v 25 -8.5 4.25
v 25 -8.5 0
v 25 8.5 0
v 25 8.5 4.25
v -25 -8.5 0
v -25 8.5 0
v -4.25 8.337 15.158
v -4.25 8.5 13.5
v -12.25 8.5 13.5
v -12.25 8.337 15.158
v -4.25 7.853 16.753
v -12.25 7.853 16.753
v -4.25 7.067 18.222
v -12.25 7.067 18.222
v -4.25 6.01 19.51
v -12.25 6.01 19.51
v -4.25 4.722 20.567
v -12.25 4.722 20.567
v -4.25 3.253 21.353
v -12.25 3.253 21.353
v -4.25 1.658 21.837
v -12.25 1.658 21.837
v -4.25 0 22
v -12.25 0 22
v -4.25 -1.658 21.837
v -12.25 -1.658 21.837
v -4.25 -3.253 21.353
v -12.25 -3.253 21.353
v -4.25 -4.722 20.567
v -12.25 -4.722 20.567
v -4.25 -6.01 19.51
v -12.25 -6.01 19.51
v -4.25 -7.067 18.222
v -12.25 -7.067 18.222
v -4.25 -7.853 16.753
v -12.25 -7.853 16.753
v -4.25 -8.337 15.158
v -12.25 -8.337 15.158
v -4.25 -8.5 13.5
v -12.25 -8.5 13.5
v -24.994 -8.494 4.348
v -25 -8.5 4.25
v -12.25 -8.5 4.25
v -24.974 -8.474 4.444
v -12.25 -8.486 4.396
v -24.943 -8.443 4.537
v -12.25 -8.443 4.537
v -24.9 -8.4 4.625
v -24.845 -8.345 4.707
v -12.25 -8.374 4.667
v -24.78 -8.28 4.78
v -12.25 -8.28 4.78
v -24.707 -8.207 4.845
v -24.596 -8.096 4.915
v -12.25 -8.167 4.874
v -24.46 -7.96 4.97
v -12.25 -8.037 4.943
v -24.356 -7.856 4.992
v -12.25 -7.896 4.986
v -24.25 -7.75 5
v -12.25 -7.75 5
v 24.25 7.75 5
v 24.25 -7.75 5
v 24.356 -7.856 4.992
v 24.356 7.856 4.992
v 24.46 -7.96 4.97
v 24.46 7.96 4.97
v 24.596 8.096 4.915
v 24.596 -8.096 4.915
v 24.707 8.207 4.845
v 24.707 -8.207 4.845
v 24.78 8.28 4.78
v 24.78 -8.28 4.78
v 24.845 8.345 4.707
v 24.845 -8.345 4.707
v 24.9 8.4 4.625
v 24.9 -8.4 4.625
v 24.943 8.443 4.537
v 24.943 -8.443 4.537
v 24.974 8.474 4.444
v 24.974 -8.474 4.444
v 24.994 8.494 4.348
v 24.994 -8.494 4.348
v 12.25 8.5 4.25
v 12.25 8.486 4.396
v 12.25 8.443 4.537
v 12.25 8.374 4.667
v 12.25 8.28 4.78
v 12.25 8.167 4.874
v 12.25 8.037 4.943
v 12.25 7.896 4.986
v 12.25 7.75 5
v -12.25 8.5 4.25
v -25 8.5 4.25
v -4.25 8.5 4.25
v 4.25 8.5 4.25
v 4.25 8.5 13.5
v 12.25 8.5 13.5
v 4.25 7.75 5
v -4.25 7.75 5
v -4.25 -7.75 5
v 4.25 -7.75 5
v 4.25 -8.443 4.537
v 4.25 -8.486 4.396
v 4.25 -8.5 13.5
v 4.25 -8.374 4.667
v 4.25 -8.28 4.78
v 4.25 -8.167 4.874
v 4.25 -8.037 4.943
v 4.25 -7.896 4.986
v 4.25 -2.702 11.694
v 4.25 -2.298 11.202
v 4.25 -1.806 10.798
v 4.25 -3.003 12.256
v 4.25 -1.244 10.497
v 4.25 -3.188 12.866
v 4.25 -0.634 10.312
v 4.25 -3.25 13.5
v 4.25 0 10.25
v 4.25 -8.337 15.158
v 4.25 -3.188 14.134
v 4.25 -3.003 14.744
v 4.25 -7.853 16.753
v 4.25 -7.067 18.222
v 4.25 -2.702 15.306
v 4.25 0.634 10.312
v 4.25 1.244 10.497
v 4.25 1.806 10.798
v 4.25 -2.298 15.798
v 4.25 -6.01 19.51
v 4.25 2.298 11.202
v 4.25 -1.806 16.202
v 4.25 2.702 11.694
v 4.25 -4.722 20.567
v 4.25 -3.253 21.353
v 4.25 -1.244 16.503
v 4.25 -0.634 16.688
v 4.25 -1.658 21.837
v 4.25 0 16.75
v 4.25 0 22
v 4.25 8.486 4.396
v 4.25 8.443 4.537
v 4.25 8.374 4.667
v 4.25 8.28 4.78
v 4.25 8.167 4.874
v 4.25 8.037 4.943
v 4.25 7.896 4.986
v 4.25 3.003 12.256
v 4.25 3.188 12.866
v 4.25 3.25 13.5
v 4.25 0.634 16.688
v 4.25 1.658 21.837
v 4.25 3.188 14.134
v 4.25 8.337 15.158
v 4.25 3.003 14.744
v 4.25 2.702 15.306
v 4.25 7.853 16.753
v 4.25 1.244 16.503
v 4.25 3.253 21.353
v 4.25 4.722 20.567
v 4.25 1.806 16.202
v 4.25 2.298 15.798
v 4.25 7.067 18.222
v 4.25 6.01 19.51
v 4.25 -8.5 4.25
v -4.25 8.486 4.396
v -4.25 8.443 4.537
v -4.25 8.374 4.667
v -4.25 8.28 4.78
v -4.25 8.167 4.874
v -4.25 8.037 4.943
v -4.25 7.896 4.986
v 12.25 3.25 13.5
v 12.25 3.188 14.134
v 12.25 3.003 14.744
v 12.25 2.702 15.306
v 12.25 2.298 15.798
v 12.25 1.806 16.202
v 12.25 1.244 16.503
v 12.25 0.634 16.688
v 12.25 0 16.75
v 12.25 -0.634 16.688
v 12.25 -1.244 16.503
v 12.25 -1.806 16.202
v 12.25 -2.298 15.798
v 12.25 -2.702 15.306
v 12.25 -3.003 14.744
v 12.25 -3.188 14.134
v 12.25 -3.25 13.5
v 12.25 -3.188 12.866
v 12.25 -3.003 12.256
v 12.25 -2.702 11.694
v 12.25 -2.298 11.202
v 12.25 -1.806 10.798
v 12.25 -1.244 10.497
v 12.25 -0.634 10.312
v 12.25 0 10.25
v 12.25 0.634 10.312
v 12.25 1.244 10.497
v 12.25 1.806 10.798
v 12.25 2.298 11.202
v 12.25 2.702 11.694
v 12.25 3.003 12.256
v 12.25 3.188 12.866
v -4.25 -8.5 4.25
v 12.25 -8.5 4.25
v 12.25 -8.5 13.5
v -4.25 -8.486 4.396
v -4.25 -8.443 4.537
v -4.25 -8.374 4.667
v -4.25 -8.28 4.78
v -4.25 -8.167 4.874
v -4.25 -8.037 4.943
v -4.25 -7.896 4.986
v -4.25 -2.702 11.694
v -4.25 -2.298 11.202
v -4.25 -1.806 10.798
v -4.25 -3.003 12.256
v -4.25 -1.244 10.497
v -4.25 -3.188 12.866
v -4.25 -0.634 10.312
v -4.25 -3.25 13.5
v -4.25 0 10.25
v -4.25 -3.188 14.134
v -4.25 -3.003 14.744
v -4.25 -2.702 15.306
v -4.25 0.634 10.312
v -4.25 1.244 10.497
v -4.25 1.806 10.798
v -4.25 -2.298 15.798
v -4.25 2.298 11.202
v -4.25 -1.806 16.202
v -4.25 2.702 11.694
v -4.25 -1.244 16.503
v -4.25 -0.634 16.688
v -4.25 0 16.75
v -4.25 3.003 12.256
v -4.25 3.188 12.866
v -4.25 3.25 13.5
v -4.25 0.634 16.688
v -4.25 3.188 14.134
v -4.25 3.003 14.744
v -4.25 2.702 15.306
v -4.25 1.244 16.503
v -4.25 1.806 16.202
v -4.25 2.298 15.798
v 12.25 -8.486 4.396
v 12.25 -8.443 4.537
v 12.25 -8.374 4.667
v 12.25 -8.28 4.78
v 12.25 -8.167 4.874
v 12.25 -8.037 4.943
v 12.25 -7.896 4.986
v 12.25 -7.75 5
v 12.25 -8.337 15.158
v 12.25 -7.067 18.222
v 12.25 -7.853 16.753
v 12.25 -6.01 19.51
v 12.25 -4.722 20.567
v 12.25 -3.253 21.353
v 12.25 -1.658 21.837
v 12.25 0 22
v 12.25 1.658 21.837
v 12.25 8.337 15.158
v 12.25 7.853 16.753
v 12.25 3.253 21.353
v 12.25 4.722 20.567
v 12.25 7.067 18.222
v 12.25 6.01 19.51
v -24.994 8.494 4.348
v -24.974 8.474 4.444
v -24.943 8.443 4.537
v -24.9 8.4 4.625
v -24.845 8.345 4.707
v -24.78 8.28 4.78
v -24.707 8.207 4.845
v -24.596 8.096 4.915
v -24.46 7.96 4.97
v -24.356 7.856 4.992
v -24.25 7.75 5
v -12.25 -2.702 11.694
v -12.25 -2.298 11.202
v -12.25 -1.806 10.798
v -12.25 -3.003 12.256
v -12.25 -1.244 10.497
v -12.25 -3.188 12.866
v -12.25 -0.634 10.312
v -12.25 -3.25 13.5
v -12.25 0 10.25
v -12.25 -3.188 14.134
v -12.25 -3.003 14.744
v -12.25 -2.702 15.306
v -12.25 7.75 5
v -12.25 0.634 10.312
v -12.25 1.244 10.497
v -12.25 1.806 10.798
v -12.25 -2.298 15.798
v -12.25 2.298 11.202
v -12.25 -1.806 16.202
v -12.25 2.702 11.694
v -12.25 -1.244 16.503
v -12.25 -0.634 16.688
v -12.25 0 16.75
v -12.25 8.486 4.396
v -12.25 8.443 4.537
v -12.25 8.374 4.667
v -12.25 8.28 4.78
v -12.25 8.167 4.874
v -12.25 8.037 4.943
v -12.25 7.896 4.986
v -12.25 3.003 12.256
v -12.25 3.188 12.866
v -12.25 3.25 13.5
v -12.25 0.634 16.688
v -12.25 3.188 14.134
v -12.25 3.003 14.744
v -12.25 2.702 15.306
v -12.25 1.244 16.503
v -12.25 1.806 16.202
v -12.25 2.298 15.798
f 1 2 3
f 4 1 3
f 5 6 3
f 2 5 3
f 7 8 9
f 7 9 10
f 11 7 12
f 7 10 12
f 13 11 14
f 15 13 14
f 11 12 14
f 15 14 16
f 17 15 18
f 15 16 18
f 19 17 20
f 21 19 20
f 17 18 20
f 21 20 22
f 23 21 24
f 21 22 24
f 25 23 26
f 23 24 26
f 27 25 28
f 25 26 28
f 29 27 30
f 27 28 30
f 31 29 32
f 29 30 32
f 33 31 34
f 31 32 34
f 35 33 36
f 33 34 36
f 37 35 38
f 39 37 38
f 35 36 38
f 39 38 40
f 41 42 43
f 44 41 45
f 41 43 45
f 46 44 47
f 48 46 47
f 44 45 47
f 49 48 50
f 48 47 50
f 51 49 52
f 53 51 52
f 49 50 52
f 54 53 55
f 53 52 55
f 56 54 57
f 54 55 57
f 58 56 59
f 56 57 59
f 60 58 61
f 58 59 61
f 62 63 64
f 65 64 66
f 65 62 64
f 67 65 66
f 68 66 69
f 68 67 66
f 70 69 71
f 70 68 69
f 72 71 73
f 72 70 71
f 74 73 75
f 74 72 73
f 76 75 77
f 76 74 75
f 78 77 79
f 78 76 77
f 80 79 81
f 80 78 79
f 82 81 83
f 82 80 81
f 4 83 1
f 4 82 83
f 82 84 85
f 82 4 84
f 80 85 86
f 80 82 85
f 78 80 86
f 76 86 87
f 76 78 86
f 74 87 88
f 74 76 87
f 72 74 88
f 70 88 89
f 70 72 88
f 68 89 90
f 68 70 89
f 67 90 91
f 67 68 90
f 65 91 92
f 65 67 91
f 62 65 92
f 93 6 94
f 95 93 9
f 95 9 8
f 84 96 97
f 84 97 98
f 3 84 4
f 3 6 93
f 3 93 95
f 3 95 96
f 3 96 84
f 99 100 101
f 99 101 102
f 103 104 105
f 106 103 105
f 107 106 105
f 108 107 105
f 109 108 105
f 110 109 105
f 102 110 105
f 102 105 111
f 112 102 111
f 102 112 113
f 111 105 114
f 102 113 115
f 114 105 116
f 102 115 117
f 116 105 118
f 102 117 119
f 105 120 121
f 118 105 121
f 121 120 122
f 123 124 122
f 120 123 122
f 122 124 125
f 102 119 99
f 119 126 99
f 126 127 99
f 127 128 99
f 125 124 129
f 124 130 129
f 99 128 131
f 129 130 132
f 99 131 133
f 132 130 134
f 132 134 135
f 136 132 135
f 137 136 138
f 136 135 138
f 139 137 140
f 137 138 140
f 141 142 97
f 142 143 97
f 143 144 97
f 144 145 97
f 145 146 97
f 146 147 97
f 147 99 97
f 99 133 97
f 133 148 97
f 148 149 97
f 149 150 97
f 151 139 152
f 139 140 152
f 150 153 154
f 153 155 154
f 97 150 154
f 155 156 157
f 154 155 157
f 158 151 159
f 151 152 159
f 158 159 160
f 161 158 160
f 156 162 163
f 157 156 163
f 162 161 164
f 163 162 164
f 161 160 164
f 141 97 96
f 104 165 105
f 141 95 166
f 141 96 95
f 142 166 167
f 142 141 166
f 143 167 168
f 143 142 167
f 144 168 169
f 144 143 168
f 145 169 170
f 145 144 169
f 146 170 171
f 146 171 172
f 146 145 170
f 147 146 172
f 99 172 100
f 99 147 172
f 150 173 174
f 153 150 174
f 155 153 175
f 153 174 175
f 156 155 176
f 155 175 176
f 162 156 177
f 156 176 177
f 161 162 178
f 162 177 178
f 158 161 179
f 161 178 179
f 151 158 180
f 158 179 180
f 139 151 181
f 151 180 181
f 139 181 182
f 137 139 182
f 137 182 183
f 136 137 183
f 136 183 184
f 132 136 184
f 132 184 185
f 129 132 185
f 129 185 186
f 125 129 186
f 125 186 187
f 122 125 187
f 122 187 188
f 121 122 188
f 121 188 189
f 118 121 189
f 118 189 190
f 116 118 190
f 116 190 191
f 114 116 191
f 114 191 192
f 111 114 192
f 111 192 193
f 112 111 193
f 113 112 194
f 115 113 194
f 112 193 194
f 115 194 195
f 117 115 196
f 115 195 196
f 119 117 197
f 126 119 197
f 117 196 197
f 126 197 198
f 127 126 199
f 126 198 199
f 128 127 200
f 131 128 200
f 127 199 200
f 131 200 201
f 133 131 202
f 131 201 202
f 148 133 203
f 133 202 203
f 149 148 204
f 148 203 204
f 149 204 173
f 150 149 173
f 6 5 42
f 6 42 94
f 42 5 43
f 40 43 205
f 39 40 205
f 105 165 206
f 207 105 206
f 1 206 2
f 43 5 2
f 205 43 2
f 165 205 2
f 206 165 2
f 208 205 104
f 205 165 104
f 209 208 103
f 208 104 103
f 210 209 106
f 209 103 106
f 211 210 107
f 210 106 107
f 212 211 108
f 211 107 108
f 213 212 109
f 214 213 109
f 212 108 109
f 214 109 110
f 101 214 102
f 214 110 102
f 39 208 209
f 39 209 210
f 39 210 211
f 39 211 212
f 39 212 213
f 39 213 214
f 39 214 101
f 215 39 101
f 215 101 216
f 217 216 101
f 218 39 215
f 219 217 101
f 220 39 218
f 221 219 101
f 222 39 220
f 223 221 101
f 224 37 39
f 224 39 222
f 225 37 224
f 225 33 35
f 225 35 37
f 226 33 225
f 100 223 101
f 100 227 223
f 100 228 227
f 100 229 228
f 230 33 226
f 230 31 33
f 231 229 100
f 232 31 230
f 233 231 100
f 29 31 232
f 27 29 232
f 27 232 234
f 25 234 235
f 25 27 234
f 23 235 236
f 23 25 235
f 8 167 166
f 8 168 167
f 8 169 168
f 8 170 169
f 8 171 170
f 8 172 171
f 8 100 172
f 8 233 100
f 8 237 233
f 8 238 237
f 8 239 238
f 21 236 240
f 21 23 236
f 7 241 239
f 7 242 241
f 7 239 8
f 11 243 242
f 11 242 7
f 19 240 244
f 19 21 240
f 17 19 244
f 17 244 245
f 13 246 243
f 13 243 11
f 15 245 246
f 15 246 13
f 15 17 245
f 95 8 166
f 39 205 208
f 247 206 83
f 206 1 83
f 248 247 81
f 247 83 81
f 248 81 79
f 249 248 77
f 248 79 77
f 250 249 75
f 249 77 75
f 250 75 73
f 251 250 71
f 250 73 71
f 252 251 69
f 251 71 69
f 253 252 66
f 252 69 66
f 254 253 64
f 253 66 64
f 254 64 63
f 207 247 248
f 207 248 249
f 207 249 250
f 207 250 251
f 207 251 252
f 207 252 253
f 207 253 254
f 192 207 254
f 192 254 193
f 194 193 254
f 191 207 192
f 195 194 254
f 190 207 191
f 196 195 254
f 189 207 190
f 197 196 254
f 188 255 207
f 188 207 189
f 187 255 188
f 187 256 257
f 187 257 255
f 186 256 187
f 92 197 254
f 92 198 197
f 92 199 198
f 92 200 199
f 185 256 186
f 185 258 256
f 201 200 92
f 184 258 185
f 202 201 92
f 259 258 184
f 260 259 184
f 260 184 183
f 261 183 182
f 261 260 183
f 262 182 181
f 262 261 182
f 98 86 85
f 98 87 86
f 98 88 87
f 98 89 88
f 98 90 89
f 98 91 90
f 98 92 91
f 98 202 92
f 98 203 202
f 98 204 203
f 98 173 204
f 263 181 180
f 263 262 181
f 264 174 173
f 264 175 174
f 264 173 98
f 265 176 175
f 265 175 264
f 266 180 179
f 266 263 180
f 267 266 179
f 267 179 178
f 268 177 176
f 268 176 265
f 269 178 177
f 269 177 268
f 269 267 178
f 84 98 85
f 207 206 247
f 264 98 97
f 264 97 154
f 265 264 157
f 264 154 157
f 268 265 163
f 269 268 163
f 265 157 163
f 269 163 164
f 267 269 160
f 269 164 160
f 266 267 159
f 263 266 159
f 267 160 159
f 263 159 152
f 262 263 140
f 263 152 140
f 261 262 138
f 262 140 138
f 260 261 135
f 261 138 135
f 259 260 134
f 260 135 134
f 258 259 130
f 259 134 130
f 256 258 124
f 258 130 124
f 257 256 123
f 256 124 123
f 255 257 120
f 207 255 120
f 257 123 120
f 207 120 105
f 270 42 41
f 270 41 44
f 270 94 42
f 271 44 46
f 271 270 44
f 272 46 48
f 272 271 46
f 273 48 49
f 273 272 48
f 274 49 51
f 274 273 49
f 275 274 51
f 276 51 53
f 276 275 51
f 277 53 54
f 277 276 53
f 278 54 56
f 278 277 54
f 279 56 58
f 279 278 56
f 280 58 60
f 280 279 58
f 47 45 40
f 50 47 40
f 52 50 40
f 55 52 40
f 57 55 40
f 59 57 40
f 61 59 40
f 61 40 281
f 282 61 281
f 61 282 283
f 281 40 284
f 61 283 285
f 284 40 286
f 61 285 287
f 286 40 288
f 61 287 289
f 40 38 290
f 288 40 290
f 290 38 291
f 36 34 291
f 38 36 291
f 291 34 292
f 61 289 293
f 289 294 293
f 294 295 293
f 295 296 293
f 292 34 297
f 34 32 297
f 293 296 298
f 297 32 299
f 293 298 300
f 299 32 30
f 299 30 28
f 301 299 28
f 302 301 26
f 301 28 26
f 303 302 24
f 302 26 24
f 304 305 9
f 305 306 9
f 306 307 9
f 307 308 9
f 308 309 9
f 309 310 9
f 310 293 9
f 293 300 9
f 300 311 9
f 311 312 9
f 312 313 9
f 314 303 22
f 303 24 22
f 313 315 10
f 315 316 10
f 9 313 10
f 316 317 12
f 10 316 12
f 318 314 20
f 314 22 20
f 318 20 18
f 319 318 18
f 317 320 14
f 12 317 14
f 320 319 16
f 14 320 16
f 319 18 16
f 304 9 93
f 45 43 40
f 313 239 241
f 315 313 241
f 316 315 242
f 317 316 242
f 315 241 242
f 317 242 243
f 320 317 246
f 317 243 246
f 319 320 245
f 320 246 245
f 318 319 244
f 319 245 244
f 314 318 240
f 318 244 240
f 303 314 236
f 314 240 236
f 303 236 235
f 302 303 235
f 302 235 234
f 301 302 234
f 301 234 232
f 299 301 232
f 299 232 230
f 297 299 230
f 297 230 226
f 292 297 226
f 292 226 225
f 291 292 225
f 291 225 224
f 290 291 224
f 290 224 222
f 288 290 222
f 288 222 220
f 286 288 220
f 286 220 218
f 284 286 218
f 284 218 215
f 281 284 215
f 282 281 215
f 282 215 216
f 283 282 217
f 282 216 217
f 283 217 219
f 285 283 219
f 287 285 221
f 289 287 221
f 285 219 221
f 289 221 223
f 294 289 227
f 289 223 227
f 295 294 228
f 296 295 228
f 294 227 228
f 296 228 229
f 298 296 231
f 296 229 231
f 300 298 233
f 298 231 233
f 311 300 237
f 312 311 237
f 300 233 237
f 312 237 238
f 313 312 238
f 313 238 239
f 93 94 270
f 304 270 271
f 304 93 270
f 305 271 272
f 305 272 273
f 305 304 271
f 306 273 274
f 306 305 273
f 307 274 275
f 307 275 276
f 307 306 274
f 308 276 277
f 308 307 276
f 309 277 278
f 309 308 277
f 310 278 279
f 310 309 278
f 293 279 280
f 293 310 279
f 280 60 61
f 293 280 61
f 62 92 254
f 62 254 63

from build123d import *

# Parameters (mm, degrees)
F0_W      = 50
F0_H      = 17
F1_DEPTH  = 5
F5_DEPTH  = 8
F8_DEPTH  = 8
F9_R      = 3.25
F10_DEPTH = 25
F11_R     = 0.75


with BuildPart() as f1:
    # F0 (on Top) → F1 (new body)
    with BuildSketch(Plane.XY):
        Rectangle(F0_W, F0_H)
    extrude(amount=F1_DEPTH)

    # F4 (on line) → F5 (join)
    with BuildSketch(Plane.YZ.offset(-12.25)):
        with BuildLine():
            ThreePointArc((0, 5), (6.0104076401, 7.4895923599), (8.5, 13.5))
            ThreePointArc((8.5, 13.5), (0, 22), (-8.5, 13.5))
            ThreePointArc((-8.5, 13.5), (-6.0104076401, 7.4895923599), (0, 5))
        make_face()
        with BuildLine():
            Line((8.5, 5), (8.5, 13.5))
            ThreePointArc((8.5, 13.5), (6.0104076401, 7.4895923599), (0, 5))
            Line((0, 5), (8.5, 5))
        make_face()
        with BuildLine():
            ThreePointArc((0, 5), (-6.0104076401, 7.4895923599), (-8.5, 13.5))
            Line((-8.5, 13.5), (-8.5, 5))
            Line((-8.5, 5), (0, 5))
        make_face()
    extrude(amount=F5_DEPTH)

    # F7 (on line) → F8 (join)
    with BuildSketch(Plane.YZ.offset(4.25)):
        with BuildLine():
            ThreePointArc((0, 5), (6.0104076401, 7.4895923599), (8.5, 13.5))
            ThreePointArc((8.5, 13.5), (0, 22), (-8.5, 13.5))
            ThreePointArc((-8.5, 13.5), (-6.0104076401, 7.4895923599), (0, 5))
        make_face()
        with BuildLine():
            Line((8.5, 5), (8.5, 13.5))
            ThreePointArc((8.5, 13.5), (6.0104076401, 7.4895923599), (0, 5))
            Line((0, 5), (8.5, 5))
        make_face()
        with BuildLine():
            ThreePointArc((0, 5), (-6.0104076401, 7.4895923599), (-8.5, 13.5))
            Line((-8.5, 13.5), (-8.5, 5))
            Line((-8.5, 5), (0, 5))
        make_face()
    extrude(amount=F8_DEPTH)

    # F9 (on face) → F10 (cut)
    with BuildSketch(Plane.YZ.offset(12.25)):
        with Locations((0, 13.5)):
            Circle(F9_R)
    extrude(amount=-F10_DEPTH, mode=Mode.SUBTRACT)

    # F11
    f11_edges = [f1.edges().sort_by_distance(p)[0] for p in [
        (18.625, 8.5, 5),
        (0, 8.5, 5),
        (-18.625, 8.5, 5),
        (-18.625, -8.5, 5),
        (-25, 0, 5),
        (0, -8.5, 5),
        (18.625, -8.5, 5),
        (25, 0, 5),
    ]]
    fillet(f11_edges, radius=F11_R)


solid = f1.part
